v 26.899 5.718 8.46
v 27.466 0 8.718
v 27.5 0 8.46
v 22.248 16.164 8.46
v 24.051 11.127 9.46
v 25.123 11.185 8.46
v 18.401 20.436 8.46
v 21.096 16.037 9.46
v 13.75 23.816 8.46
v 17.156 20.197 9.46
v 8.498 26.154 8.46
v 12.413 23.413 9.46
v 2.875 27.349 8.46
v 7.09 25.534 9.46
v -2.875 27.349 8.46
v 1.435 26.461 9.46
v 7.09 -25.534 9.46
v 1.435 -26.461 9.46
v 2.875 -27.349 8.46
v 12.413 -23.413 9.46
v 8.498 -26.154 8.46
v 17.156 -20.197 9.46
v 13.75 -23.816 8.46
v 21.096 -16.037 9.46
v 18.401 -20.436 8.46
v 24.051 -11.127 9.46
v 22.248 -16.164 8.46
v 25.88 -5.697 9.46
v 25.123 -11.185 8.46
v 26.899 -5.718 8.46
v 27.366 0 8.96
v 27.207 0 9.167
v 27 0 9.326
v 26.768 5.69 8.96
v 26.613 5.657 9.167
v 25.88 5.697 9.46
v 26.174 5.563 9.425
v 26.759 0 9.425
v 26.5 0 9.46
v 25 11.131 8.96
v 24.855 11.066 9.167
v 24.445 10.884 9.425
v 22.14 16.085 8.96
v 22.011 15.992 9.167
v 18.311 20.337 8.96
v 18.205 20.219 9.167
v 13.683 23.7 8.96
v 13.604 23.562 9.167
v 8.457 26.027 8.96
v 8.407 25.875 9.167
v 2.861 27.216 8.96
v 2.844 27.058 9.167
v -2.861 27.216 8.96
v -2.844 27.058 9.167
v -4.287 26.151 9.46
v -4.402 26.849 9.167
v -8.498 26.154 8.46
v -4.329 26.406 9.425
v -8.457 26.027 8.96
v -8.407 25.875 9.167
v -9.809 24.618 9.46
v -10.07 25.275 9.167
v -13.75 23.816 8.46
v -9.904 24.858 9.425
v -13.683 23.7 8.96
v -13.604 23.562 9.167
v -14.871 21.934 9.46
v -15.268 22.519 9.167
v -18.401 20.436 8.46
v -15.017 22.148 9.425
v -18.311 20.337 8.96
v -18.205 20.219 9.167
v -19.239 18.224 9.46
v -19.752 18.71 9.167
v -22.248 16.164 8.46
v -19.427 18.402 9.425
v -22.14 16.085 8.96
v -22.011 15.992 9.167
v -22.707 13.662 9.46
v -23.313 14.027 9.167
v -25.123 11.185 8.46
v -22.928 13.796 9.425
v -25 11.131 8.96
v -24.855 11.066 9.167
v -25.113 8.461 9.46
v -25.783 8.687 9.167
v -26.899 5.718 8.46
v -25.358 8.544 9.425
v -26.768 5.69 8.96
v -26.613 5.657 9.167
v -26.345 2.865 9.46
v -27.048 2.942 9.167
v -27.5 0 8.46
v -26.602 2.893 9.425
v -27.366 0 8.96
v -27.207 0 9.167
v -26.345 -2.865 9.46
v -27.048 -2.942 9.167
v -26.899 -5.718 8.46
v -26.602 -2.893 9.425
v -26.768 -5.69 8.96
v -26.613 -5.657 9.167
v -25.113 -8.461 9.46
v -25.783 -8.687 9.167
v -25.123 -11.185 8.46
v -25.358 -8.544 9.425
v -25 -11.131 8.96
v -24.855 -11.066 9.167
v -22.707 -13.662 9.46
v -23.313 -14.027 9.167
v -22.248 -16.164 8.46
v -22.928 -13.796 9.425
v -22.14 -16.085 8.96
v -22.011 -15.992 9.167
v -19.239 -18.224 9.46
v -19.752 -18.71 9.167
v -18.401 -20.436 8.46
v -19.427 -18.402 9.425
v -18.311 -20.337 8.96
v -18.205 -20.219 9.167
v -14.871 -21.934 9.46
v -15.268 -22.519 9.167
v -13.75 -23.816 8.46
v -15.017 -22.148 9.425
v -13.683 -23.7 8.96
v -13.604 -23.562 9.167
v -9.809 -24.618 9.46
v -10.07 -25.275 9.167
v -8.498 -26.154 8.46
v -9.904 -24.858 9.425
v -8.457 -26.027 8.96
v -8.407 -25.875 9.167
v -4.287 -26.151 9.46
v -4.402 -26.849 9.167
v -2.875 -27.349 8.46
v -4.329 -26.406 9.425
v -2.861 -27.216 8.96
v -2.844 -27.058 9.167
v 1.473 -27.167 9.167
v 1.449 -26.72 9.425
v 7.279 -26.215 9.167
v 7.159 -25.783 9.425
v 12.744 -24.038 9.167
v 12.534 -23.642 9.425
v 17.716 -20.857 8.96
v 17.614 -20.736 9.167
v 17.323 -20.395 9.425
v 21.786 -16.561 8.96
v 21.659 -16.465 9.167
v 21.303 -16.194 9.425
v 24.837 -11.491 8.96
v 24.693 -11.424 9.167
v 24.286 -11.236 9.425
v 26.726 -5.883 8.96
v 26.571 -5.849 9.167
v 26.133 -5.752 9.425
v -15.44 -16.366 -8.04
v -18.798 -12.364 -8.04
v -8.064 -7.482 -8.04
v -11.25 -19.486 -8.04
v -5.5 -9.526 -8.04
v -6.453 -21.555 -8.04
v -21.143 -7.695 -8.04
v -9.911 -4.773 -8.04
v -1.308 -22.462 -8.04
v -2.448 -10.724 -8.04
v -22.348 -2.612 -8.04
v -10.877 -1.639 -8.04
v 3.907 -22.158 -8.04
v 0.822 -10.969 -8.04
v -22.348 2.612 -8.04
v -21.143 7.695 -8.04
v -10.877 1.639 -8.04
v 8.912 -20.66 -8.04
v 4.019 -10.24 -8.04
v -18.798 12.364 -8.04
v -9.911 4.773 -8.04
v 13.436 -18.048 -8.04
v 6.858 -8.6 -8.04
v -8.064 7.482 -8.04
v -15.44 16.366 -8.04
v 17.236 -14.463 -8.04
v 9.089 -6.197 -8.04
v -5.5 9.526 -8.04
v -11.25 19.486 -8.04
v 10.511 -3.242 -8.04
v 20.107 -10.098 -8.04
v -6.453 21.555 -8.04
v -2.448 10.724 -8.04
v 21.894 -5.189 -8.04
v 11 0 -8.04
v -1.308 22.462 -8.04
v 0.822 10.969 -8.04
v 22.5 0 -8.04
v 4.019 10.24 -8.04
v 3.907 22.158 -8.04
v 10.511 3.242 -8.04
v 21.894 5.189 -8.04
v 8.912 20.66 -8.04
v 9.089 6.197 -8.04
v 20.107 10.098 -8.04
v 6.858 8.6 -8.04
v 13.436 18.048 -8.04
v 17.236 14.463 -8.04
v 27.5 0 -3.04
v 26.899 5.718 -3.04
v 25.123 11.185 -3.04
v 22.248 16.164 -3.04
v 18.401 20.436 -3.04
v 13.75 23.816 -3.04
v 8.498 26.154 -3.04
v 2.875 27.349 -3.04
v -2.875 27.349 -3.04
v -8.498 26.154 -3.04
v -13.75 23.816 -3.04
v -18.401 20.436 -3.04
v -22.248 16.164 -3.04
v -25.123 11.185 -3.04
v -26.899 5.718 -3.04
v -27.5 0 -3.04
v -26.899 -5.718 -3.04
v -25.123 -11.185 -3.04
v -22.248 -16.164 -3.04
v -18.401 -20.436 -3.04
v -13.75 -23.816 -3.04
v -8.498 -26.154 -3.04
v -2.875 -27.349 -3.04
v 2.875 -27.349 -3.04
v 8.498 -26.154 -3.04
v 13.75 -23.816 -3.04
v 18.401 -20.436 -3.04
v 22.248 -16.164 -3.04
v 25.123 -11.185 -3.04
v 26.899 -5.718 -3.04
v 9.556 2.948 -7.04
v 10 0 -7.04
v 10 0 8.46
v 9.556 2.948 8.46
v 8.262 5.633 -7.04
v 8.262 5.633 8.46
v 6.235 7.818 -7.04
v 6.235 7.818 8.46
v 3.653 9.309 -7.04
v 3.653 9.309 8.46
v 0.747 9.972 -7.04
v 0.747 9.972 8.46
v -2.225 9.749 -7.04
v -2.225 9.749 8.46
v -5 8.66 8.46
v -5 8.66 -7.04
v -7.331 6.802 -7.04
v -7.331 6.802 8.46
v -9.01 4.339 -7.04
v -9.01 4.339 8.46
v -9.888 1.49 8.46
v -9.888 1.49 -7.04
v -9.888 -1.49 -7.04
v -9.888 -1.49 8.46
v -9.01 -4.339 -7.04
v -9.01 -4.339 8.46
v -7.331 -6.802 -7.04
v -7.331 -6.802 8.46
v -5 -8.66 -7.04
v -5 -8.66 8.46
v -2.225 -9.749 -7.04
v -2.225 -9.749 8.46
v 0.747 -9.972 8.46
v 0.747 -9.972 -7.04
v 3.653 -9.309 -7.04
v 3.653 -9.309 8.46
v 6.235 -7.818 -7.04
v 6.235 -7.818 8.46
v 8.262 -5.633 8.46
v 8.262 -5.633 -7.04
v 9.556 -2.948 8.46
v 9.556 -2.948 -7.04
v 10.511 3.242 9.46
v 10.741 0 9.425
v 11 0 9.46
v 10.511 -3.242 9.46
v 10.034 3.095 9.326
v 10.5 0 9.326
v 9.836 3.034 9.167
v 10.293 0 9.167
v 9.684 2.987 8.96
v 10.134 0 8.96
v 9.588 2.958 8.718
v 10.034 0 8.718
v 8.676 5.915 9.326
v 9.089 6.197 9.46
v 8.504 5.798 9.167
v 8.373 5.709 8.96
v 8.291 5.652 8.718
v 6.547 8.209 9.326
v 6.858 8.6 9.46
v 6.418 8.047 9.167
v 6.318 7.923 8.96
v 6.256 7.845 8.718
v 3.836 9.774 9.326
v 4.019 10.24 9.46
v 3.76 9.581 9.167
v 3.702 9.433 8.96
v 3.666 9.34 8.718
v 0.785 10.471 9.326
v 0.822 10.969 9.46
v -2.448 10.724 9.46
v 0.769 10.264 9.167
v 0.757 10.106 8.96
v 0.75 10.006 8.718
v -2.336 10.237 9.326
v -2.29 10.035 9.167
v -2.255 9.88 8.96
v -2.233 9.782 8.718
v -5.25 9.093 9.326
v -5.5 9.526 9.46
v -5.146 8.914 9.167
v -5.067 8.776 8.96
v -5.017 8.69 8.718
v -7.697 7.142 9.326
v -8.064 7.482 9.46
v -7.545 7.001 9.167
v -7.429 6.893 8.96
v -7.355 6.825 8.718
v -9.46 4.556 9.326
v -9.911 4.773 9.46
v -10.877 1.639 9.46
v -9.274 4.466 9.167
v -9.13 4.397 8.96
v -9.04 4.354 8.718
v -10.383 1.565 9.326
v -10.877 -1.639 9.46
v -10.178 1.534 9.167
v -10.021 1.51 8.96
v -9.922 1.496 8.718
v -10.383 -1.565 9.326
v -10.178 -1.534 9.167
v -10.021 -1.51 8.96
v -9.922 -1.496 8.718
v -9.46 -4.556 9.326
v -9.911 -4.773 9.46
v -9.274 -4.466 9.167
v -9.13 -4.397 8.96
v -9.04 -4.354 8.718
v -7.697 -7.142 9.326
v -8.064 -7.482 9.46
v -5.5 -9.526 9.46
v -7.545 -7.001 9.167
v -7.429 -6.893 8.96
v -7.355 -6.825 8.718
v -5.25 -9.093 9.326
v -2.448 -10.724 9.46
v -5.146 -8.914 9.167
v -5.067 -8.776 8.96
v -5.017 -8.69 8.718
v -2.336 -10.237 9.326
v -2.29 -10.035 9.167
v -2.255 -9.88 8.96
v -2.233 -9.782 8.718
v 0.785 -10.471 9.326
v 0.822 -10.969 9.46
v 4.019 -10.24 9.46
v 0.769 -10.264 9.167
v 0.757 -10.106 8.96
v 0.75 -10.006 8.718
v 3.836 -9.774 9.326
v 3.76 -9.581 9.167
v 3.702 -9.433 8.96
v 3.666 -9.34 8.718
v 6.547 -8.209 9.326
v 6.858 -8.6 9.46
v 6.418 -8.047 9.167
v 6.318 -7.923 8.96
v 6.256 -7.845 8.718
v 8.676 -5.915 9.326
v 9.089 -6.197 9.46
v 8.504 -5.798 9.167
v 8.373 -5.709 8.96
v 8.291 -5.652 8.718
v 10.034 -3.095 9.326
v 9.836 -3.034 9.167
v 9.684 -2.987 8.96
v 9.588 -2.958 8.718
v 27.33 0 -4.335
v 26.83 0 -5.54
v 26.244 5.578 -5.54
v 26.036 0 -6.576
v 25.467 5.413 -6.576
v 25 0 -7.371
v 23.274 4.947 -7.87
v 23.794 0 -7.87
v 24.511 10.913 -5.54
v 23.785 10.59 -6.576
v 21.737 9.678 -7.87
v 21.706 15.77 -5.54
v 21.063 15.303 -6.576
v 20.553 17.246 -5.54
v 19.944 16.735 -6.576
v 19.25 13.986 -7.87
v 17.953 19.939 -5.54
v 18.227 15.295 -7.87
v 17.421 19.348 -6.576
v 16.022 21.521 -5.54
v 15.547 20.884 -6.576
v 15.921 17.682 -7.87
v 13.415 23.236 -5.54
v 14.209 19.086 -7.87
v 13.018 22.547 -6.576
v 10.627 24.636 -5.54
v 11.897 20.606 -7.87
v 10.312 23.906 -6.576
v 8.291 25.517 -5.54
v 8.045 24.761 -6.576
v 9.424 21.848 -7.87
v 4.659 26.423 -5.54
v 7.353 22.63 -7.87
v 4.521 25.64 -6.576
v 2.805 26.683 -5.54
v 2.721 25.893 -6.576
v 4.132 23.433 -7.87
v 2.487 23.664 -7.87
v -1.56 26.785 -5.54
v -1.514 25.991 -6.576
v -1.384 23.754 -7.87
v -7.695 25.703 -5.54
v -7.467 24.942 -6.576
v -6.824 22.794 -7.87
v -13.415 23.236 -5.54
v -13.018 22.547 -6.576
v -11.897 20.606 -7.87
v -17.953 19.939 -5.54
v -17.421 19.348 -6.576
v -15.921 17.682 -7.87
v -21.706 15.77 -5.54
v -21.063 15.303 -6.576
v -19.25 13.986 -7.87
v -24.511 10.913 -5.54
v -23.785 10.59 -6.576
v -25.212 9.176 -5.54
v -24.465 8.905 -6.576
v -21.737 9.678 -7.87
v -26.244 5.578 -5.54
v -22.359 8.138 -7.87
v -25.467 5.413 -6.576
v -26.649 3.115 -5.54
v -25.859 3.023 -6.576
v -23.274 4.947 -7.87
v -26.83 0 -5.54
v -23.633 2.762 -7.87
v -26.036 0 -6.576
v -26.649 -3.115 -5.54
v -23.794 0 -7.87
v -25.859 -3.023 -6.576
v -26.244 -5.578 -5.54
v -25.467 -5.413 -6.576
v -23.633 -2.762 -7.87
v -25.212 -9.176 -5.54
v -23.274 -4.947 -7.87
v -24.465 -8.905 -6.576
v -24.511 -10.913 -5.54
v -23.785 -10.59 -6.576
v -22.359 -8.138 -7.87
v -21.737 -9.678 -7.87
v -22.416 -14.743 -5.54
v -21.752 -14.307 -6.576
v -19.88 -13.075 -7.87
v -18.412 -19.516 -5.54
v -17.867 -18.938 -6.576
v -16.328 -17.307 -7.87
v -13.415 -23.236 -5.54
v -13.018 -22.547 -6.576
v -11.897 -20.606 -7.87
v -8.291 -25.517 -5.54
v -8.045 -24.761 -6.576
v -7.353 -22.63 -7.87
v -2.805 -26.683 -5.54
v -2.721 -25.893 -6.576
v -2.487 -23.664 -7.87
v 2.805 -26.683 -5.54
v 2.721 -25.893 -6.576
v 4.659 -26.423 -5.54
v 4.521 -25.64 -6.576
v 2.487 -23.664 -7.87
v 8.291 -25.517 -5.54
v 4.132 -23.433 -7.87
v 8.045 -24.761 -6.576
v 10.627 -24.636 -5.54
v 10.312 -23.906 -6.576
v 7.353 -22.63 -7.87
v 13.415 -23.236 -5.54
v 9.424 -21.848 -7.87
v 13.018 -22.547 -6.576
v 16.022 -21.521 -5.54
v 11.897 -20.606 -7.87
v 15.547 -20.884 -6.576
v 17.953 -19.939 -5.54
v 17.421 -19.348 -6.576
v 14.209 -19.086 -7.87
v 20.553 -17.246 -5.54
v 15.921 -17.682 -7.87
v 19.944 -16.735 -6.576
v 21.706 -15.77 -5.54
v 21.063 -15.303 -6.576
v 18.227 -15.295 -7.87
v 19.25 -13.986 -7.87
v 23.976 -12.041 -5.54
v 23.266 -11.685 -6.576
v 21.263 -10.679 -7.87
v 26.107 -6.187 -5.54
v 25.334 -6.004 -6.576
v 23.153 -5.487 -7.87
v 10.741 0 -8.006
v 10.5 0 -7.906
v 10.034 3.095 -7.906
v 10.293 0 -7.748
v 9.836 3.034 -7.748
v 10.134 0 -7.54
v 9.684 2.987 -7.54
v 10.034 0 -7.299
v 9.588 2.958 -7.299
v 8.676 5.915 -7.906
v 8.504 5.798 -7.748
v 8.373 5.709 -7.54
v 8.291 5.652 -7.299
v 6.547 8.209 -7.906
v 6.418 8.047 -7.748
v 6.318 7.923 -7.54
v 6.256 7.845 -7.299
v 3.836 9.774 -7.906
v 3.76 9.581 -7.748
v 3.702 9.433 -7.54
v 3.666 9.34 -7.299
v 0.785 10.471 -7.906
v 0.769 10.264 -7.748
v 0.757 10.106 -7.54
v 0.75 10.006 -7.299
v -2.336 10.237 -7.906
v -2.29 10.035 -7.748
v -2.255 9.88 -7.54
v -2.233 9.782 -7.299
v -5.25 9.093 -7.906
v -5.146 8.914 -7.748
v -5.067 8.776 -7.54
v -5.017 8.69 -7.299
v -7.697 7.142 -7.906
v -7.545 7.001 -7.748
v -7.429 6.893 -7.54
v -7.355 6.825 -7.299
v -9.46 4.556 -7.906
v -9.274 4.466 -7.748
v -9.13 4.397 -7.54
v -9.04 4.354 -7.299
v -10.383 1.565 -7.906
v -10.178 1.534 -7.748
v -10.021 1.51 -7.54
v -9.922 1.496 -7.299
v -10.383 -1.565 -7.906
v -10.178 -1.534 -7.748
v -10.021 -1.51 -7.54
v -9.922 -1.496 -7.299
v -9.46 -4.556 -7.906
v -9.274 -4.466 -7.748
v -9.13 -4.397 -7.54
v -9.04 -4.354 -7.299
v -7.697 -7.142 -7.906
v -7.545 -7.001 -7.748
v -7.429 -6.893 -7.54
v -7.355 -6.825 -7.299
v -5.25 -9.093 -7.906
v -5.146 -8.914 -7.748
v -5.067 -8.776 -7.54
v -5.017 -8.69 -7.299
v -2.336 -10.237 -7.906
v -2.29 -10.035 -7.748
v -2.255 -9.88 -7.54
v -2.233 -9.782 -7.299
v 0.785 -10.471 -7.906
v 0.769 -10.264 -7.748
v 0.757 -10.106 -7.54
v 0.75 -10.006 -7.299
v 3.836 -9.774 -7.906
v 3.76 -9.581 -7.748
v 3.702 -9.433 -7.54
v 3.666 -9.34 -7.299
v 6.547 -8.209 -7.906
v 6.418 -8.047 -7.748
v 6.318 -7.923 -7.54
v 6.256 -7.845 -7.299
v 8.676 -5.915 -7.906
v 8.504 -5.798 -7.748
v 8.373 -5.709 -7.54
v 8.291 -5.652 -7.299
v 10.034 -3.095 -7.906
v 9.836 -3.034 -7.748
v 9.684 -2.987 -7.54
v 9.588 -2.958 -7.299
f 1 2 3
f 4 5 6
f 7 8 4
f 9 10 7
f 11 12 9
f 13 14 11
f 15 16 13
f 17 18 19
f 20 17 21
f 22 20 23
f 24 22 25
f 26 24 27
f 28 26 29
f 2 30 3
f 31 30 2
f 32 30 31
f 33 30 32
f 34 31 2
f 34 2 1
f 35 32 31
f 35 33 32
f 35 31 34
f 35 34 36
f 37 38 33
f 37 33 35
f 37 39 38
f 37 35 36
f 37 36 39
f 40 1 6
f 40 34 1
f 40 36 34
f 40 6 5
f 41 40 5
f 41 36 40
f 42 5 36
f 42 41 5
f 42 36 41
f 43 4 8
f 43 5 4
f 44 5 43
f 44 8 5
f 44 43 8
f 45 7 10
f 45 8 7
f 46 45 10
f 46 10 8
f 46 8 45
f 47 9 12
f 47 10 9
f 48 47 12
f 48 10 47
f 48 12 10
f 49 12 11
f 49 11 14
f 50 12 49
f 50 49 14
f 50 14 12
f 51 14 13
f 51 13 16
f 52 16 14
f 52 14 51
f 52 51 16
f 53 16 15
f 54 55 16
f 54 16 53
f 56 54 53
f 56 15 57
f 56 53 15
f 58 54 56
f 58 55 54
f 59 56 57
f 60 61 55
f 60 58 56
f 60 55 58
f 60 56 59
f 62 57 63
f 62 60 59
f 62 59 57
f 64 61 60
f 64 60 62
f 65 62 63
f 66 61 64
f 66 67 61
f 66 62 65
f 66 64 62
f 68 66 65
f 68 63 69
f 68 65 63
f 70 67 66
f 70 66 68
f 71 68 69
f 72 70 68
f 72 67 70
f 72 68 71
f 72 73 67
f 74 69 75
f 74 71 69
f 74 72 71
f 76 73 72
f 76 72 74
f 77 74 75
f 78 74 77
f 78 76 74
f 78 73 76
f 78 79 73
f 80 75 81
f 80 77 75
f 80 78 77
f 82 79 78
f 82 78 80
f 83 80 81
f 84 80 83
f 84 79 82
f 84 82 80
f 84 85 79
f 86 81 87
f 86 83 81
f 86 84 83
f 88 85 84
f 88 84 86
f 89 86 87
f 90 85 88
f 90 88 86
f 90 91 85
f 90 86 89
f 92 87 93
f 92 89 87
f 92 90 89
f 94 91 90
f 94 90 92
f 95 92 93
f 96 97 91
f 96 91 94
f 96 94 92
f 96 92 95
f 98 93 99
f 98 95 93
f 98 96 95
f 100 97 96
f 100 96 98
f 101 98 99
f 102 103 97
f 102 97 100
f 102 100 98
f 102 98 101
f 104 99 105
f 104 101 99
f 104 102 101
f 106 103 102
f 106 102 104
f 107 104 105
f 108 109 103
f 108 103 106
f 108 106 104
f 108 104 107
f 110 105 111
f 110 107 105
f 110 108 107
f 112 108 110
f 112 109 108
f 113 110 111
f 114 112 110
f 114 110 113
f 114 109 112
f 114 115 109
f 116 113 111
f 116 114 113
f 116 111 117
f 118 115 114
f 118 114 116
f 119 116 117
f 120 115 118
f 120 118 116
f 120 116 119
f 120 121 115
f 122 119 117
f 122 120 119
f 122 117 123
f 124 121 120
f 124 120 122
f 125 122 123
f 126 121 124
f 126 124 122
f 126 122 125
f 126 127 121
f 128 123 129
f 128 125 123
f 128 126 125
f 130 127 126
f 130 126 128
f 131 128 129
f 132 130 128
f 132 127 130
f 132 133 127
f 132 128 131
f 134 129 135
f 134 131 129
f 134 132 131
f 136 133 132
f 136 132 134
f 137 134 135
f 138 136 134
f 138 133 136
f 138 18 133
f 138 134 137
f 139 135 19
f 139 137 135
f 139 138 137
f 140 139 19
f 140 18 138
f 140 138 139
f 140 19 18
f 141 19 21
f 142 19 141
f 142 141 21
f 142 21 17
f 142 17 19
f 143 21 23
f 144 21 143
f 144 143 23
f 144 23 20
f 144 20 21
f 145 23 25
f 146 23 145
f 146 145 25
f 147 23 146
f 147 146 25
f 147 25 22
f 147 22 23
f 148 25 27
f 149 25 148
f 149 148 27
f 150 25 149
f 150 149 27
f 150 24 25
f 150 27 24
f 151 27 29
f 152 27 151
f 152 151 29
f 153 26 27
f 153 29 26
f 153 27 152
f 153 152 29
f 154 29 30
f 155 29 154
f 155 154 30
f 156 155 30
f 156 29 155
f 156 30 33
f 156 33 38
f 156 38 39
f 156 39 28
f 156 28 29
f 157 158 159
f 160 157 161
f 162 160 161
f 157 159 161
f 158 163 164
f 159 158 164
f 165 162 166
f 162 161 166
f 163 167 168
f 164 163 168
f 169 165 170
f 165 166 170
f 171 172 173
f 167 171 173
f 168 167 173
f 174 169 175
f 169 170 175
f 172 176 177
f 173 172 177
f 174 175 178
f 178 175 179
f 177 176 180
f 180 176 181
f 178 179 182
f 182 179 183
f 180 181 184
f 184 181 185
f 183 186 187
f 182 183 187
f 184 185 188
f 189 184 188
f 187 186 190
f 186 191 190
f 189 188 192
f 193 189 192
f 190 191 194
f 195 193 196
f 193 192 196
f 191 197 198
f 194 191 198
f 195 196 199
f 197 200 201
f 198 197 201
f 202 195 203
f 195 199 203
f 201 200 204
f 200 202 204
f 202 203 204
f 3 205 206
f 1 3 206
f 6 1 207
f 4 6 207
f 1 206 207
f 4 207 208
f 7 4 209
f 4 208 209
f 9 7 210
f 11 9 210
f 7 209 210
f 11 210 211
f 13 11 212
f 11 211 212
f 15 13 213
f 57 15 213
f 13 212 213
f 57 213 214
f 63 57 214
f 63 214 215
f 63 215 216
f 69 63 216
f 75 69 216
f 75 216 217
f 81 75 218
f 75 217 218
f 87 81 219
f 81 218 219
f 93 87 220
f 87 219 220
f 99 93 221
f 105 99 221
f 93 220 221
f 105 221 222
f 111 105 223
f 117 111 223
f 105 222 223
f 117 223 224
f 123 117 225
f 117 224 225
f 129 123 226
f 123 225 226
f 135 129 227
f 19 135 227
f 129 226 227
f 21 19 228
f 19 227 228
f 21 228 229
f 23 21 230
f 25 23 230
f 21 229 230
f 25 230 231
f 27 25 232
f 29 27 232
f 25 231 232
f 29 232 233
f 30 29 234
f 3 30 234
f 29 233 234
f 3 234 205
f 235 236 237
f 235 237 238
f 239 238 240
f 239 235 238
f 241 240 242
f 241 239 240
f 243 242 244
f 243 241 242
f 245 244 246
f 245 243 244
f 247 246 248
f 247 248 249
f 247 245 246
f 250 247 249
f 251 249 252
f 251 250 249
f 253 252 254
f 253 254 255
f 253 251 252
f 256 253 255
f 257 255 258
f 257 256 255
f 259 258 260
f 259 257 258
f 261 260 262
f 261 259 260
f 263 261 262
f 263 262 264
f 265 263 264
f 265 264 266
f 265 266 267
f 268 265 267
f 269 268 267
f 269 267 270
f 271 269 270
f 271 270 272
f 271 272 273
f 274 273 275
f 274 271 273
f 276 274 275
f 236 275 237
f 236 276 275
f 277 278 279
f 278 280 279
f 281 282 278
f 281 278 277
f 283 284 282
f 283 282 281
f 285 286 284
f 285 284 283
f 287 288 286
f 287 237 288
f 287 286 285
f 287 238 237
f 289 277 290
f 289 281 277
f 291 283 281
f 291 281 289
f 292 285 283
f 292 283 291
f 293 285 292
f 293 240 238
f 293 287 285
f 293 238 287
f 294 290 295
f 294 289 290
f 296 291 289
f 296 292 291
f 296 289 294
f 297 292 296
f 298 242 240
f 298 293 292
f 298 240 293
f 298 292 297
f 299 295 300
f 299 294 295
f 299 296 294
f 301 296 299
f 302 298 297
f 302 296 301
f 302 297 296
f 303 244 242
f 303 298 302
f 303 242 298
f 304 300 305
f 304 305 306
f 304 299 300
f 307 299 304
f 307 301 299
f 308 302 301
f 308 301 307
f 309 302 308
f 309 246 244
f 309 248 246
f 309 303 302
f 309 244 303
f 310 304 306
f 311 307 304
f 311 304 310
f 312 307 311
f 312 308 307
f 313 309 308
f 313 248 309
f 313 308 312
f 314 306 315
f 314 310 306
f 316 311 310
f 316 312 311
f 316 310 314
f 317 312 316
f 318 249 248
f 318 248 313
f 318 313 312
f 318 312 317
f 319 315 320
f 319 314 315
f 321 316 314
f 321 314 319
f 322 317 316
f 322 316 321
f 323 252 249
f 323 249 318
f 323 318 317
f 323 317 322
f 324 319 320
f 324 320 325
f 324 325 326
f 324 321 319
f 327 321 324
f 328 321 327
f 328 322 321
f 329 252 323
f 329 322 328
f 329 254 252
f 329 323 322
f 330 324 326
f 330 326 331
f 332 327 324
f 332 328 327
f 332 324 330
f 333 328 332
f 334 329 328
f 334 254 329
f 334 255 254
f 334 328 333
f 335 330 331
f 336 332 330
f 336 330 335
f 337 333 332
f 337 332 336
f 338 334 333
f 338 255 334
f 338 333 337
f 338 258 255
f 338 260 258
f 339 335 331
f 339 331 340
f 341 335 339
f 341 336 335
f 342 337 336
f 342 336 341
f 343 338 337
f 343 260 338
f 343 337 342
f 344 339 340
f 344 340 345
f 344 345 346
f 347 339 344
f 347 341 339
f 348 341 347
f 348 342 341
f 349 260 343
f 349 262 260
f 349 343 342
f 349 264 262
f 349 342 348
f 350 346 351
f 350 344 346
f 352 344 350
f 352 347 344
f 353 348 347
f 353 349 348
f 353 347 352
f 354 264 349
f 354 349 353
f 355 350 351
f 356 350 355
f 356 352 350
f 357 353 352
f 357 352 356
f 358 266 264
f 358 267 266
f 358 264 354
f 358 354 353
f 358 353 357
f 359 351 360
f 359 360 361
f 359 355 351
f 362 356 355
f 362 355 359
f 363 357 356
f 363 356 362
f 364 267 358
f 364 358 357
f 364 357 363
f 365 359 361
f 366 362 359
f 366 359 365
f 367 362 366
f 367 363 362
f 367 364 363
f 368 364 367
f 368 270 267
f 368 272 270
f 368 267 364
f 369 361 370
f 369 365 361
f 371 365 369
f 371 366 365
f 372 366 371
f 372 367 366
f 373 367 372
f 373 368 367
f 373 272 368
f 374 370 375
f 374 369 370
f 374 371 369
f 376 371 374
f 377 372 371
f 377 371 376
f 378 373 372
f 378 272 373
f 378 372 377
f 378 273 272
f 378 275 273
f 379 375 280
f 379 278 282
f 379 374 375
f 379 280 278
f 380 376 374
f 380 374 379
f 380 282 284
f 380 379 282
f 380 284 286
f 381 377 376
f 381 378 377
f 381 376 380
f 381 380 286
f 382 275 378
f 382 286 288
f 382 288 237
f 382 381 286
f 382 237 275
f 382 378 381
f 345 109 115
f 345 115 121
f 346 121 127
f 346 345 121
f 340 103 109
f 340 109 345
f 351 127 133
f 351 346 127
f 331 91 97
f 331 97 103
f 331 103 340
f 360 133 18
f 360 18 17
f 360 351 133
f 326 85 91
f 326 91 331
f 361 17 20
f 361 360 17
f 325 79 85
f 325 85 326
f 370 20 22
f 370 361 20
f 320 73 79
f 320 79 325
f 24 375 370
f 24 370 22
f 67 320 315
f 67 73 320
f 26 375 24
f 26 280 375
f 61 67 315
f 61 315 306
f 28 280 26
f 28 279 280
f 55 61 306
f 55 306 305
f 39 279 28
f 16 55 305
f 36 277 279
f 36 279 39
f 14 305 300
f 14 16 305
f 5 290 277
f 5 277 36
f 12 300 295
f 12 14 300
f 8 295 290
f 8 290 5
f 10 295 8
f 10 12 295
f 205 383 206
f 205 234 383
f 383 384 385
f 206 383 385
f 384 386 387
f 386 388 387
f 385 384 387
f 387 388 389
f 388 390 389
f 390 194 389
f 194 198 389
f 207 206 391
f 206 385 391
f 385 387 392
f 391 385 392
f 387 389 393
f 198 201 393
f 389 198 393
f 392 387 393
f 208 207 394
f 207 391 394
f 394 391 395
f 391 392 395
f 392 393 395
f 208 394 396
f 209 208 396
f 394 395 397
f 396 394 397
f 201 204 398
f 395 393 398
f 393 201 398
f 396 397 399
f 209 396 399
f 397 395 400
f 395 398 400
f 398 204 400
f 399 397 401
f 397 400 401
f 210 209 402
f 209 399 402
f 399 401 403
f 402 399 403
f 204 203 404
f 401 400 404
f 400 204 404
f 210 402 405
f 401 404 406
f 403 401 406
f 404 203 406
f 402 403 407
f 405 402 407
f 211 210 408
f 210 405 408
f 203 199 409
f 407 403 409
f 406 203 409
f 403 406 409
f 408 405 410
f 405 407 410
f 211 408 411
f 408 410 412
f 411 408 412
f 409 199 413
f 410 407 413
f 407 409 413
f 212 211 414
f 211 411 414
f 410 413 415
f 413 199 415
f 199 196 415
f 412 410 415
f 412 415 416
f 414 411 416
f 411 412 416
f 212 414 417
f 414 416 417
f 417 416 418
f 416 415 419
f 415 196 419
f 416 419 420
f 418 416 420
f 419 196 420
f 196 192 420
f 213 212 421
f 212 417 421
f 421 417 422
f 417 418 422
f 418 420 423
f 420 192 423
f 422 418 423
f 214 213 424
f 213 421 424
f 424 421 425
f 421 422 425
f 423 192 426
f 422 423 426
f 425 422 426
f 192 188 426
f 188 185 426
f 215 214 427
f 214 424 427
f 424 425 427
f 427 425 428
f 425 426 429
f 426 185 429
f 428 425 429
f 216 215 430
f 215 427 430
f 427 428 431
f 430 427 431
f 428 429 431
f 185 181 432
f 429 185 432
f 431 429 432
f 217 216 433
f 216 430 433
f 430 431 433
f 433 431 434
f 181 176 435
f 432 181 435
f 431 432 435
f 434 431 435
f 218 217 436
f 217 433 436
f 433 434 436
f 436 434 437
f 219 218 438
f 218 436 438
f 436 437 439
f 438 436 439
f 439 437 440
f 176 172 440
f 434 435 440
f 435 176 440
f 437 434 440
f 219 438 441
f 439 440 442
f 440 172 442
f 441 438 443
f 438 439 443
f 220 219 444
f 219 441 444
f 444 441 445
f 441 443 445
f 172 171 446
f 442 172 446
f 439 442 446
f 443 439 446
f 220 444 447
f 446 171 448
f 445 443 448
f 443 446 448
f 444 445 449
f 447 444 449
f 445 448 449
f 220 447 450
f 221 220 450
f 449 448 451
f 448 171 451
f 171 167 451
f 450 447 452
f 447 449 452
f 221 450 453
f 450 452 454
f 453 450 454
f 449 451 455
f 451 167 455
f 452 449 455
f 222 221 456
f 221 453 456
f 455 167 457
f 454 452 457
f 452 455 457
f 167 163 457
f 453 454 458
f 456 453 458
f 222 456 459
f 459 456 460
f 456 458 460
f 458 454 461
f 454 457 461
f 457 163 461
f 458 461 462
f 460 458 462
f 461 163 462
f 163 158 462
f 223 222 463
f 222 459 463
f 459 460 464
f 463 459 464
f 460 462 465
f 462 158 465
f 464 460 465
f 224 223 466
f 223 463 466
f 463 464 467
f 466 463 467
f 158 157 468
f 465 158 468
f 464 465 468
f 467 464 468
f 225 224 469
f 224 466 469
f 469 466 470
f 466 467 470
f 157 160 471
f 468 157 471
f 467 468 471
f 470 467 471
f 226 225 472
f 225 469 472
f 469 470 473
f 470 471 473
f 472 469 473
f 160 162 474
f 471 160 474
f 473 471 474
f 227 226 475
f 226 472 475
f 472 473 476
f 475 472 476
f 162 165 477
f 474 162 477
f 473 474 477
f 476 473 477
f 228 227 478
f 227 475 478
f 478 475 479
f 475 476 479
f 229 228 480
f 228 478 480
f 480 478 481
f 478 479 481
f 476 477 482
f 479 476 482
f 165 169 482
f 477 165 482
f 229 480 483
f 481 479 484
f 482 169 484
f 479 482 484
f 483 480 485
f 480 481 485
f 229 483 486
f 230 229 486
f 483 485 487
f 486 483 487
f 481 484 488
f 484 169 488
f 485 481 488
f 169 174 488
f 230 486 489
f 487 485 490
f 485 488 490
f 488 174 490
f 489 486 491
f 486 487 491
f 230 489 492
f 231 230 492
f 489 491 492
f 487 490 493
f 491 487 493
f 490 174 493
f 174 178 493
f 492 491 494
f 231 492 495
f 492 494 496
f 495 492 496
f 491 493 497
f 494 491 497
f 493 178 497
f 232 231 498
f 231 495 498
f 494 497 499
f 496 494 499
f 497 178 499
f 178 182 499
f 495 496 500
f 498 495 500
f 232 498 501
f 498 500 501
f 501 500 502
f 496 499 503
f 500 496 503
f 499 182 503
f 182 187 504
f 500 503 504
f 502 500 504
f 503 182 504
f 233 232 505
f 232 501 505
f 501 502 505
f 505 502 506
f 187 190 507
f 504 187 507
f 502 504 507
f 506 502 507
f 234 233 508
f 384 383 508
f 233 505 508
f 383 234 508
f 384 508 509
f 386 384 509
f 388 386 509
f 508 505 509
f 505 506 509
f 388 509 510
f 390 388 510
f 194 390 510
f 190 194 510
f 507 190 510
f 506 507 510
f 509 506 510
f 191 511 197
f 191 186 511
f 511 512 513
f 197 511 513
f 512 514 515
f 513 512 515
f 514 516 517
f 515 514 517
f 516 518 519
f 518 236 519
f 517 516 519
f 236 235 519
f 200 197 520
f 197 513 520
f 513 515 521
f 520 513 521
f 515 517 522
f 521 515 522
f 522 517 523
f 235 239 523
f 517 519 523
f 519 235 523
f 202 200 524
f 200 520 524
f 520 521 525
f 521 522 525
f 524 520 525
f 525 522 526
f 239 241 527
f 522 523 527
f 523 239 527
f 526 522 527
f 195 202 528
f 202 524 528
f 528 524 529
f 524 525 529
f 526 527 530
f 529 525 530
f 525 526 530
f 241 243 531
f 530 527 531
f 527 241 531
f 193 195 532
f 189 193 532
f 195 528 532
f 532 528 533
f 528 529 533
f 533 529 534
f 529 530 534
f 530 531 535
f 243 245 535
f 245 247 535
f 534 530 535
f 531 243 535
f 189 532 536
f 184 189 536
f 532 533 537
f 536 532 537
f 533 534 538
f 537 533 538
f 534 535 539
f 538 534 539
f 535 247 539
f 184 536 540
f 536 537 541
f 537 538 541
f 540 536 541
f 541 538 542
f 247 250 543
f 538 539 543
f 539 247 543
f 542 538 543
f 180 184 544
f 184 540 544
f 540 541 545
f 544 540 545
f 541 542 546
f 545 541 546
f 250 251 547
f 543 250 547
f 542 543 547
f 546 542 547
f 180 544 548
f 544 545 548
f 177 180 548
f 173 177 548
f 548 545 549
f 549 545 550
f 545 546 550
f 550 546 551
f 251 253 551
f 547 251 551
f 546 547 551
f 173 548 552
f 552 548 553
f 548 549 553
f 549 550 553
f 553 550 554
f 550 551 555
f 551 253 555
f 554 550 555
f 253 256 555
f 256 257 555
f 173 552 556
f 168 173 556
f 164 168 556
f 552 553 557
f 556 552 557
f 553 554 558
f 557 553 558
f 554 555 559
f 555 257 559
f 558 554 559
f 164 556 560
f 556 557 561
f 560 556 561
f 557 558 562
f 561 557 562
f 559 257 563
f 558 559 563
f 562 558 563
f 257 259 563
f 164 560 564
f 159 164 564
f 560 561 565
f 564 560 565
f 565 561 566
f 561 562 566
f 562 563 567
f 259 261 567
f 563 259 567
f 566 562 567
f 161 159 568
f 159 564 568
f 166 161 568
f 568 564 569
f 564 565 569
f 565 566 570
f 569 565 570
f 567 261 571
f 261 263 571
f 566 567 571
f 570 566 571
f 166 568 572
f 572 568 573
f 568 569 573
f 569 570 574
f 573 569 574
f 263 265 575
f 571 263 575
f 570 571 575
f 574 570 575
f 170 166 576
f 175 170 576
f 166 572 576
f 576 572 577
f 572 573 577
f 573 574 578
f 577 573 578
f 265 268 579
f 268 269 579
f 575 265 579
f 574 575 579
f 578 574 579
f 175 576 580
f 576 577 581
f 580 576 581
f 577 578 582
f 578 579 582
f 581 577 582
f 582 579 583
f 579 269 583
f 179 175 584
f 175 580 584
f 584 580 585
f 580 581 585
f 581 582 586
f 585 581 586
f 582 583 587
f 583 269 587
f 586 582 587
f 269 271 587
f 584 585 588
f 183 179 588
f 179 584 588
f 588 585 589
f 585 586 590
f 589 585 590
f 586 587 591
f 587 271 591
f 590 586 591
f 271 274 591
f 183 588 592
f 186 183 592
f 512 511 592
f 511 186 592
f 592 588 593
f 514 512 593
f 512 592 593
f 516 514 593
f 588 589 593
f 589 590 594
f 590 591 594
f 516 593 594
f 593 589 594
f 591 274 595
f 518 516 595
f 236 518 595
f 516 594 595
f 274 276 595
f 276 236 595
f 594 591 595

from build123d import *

# Parameters (mm, degrees)
SKETCH1_R           = 2.75
SKETCH1_R_2         = 1
EXTRUDE_THIN1_DEPTH = 1.75
FILLET1_R           = 0.5
FILLET2_R           = 0.1
SCALE1_SCALE        = 10


with BuildPart() as part:
    # Sketch1 → Extrude-Thin1 (new body)
    with BuildSketch(Plane.XY):
        Circle(SKETCH1_R)
        Circle(SKETCH1_R_2, mode=Mode.SUBTRACT)
    extrude(amount=EXTRUDE_THIN1_DEPTH)

    # Fillet1
    fillet1_edges = [part.edges().sort_by_distance(p)[0] for p in [
        (-2.75, 0, 0),
    ]]
    fillet(fillet1_edges, radius=FILLET1_R)

    # Fillet2
    fillet2_edges = [part.edges().sort_by_distance(p)[0] for p in [
        (-1, 0, 0),
        (-2.75, 0, 1.75),
        (-1, 0, 1.75),
    ]]
    fillet(fillet2_edges, radius=FILLET2_R)


with BuildPart() as part_1:
    # Scale1: scaled about (0, 0, 0.893384529)
    add(part.part.scale(SCALE1_SCALE).moved(Location((0, 0, -8.040460761))))


solid = part_1.part
